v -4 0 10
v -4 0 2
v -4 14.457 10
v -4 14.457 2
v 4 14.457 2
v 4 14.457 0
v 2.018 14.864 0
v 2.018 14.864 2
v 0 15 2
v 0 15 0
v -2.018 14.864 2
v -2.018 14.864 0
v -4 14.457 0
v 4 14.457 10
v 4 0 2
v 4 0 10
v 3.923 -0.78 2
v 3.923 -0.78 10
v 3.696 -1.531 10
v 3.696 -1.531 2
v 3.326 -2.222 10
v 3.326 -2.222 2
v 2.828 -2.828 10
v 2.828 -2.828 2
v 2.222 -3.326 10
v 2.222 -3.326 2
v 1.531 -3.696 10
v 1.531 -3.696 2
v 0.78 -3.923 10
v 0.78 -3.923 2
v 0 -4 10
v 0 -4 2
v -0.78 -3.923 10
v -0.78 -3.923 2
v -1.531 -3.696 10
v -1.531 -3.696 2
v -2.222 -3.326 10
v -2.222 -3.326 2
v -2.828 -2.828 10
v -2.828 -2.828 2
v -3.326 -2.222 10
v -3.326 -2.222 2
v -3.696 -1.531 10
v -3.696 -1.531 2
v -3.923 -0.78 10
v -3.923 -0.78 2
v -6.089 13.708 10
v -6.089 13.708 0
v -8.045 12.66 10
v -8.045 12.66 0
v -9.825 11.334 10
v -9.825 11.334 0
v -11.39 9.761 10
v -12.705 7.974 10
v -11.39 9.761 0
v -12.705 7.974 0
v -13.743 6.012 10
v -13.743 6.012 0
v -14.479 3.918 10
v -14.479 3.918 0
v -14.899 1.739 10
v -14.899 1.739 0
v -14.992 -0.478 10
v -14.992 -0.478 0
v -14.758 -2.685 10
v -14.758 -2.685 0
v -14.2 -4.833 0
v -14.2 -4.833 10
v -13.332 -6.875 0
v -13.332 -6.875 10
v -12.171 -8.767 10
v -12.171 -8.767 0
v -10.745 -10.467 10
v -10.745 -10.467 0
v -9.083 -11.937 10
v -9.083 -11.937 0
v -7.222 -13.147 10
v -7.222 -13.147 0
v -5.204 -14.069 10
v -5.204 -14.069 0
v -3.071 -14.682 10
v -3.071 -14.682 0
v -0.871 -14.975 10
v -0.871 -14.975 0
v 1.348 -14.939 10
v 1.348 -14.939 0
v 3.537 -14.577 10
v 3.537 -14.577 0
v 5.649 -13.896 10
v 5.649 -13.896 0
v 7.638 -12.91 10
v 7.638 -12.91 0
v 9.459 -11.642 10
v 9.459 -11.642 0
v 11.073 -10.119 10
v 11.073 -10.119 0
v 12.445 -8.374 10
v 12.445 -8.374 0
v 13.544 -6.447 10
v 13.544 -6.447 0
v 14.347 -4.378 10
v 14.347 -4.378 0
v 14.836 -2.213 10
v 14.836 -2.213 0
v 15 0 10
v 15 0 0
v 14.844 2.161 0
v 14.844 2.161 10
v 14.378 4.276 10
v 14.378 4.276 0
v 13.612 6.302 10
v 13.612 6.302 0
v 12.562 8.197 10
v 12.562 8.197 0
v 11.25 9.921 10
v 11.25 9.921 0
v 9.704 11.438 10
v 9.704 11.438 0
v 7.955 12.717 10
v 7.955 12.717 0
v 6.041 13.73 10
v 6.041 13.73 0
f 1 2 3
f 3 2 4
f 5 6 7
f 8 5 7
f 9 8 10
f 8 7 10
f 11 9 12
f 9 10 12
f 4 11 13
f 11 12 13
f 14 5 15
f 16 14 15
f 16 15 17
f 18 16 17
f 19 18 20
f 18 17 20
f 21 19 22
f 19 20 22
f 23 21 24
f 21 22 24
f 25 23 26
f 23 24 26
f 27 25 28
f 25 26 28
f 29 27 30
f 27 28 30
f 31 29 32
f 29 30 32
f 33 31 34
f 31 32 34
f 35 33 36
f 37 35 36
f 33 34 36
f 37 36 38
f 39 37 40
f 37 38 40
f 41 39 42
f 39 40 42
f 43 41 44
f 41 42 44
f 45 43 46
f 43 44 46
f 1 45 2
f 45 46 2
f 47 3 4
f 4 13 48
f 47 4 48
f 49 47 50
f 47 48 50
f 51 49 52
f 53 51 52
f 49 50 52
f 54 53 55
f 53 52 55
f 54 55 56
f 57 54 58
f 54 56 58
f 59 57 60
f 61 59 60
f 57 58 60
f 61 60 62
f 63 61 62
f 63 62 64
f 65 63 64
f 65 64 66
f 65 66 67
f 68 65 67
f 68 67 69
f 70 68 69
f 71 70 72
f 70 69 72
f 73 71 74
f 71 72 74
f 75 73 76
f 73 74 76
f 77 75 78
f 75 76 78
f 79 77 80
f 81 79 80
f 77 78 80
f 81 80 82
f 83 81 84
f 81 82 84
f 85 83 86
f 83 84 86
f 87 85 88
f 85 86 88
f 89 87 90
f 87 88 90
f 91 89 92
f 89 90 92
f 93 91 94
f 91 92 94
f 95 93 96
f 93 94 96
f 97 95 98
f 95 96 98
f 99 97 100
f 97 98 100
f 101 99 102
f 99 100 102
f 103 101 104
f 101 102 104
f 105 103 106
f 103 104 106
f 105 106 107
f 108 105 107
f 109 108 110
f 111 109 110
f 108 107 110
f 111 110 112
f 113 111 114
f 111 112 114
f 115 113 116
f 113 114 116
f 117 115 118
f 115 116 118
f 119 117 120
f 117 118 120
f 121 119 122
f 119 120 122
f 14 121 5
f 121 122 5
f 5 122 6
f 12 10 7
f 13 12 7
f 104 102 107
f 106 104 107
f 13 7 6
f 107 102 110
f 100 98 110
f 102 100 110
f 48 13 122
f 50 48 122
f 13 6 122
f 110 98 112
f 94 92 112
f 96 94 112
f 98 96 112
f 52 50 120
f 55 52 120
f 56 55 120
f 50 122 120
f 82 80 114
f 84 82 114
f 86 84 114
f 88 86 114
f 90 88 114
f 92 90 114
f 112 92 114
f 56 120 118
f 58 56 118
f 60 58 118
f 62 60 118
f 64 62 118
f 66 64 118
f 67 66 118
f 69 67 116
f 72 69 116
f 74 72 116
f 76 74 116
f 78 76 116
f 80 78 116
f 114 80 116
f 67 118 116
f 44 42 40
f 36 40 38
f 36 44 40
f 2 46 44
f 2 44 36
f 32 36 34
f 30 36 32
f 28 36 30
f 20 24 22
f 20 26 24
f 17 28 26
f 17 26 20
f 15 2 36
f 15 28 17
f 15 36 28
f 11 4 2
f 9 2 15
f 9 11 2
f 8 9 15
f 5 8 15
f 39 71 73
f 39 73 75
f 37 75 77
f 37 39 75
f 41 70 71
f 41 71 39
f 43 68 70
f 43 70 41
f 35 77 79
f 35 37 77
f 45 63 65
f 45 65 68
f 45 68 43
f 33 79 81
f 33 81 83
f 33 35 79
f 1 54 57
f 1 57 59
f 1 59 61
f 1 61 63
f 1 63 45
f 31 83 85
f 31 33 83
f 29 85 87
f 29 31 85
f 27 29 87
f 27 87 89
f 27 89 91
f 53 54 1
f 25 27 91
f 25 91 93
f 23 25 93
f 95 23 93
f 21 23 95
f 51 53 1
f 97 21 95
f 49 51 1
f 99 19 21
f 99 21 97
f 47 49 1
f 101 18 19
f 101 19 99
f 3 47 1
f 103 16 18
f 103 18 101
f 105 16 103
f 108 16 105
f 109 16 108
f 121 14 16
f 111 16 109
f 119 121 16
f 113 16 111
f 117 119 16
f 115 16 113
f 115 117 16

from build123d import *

# Parameters (mm, degrees)
F1_DEPTH = 2
F2_DEPTH = 10


with BuildPart() as f1:
    # F0 (on Top) → F1 (new body)
    with BuildSketch(Plane.XY):
        with BuildLine():
            Line((4, 14.456832), (4, 0))
            ThreePointArc((4, 0), (0, -4), (-4, 0))
            Line((-4, 0), (-4, 14.456832))
            ThreePointArc((-4, 14.456832), (-9.082951, -11.937336), (15, 0))
            ThreePointArc((15, 0), (11.937336, 9.082951), (4, 14.456832))
        make_face()
        with BuildLine():
            ThreePointArc((-4, 0), (0, 4), (4, 0))
            Line((4, 0), (4, 14.456832))
            ThreePointArc((4, 14.456832), (0, 15), (-4, 14.456832))
            Line((-4, 14.456832), (-4, 0))
        make_face()
        with BuildLine():
            ThreePointArc((-4, 0), (0, -4), (4, 0))
            ThreePointArc((4, 0), (0, 4), (-4, 0))
        make_face()
    extrude(amount=F1_DEPTH)

    # F0 (on Top) → F2 (join)
    with BuildSketch(Plane.XY):
        with BuildLine():
            Line((4, 14.456832), (4, 0))
            ThreePointArc((4, 0), (0, -4), (-4, 0))
            Line((-4, 0), (-4, 14.456832))
            ThreePointArc((-4, 14.456832), (-9.082951, -11.937336), (15, 0))
            ThreePointArc((15, 0), (11.937336, 9.082951), (4, 14.456832))
        make_face()
    extrude(amount=F2_DEPTH)


solid = f1.part
